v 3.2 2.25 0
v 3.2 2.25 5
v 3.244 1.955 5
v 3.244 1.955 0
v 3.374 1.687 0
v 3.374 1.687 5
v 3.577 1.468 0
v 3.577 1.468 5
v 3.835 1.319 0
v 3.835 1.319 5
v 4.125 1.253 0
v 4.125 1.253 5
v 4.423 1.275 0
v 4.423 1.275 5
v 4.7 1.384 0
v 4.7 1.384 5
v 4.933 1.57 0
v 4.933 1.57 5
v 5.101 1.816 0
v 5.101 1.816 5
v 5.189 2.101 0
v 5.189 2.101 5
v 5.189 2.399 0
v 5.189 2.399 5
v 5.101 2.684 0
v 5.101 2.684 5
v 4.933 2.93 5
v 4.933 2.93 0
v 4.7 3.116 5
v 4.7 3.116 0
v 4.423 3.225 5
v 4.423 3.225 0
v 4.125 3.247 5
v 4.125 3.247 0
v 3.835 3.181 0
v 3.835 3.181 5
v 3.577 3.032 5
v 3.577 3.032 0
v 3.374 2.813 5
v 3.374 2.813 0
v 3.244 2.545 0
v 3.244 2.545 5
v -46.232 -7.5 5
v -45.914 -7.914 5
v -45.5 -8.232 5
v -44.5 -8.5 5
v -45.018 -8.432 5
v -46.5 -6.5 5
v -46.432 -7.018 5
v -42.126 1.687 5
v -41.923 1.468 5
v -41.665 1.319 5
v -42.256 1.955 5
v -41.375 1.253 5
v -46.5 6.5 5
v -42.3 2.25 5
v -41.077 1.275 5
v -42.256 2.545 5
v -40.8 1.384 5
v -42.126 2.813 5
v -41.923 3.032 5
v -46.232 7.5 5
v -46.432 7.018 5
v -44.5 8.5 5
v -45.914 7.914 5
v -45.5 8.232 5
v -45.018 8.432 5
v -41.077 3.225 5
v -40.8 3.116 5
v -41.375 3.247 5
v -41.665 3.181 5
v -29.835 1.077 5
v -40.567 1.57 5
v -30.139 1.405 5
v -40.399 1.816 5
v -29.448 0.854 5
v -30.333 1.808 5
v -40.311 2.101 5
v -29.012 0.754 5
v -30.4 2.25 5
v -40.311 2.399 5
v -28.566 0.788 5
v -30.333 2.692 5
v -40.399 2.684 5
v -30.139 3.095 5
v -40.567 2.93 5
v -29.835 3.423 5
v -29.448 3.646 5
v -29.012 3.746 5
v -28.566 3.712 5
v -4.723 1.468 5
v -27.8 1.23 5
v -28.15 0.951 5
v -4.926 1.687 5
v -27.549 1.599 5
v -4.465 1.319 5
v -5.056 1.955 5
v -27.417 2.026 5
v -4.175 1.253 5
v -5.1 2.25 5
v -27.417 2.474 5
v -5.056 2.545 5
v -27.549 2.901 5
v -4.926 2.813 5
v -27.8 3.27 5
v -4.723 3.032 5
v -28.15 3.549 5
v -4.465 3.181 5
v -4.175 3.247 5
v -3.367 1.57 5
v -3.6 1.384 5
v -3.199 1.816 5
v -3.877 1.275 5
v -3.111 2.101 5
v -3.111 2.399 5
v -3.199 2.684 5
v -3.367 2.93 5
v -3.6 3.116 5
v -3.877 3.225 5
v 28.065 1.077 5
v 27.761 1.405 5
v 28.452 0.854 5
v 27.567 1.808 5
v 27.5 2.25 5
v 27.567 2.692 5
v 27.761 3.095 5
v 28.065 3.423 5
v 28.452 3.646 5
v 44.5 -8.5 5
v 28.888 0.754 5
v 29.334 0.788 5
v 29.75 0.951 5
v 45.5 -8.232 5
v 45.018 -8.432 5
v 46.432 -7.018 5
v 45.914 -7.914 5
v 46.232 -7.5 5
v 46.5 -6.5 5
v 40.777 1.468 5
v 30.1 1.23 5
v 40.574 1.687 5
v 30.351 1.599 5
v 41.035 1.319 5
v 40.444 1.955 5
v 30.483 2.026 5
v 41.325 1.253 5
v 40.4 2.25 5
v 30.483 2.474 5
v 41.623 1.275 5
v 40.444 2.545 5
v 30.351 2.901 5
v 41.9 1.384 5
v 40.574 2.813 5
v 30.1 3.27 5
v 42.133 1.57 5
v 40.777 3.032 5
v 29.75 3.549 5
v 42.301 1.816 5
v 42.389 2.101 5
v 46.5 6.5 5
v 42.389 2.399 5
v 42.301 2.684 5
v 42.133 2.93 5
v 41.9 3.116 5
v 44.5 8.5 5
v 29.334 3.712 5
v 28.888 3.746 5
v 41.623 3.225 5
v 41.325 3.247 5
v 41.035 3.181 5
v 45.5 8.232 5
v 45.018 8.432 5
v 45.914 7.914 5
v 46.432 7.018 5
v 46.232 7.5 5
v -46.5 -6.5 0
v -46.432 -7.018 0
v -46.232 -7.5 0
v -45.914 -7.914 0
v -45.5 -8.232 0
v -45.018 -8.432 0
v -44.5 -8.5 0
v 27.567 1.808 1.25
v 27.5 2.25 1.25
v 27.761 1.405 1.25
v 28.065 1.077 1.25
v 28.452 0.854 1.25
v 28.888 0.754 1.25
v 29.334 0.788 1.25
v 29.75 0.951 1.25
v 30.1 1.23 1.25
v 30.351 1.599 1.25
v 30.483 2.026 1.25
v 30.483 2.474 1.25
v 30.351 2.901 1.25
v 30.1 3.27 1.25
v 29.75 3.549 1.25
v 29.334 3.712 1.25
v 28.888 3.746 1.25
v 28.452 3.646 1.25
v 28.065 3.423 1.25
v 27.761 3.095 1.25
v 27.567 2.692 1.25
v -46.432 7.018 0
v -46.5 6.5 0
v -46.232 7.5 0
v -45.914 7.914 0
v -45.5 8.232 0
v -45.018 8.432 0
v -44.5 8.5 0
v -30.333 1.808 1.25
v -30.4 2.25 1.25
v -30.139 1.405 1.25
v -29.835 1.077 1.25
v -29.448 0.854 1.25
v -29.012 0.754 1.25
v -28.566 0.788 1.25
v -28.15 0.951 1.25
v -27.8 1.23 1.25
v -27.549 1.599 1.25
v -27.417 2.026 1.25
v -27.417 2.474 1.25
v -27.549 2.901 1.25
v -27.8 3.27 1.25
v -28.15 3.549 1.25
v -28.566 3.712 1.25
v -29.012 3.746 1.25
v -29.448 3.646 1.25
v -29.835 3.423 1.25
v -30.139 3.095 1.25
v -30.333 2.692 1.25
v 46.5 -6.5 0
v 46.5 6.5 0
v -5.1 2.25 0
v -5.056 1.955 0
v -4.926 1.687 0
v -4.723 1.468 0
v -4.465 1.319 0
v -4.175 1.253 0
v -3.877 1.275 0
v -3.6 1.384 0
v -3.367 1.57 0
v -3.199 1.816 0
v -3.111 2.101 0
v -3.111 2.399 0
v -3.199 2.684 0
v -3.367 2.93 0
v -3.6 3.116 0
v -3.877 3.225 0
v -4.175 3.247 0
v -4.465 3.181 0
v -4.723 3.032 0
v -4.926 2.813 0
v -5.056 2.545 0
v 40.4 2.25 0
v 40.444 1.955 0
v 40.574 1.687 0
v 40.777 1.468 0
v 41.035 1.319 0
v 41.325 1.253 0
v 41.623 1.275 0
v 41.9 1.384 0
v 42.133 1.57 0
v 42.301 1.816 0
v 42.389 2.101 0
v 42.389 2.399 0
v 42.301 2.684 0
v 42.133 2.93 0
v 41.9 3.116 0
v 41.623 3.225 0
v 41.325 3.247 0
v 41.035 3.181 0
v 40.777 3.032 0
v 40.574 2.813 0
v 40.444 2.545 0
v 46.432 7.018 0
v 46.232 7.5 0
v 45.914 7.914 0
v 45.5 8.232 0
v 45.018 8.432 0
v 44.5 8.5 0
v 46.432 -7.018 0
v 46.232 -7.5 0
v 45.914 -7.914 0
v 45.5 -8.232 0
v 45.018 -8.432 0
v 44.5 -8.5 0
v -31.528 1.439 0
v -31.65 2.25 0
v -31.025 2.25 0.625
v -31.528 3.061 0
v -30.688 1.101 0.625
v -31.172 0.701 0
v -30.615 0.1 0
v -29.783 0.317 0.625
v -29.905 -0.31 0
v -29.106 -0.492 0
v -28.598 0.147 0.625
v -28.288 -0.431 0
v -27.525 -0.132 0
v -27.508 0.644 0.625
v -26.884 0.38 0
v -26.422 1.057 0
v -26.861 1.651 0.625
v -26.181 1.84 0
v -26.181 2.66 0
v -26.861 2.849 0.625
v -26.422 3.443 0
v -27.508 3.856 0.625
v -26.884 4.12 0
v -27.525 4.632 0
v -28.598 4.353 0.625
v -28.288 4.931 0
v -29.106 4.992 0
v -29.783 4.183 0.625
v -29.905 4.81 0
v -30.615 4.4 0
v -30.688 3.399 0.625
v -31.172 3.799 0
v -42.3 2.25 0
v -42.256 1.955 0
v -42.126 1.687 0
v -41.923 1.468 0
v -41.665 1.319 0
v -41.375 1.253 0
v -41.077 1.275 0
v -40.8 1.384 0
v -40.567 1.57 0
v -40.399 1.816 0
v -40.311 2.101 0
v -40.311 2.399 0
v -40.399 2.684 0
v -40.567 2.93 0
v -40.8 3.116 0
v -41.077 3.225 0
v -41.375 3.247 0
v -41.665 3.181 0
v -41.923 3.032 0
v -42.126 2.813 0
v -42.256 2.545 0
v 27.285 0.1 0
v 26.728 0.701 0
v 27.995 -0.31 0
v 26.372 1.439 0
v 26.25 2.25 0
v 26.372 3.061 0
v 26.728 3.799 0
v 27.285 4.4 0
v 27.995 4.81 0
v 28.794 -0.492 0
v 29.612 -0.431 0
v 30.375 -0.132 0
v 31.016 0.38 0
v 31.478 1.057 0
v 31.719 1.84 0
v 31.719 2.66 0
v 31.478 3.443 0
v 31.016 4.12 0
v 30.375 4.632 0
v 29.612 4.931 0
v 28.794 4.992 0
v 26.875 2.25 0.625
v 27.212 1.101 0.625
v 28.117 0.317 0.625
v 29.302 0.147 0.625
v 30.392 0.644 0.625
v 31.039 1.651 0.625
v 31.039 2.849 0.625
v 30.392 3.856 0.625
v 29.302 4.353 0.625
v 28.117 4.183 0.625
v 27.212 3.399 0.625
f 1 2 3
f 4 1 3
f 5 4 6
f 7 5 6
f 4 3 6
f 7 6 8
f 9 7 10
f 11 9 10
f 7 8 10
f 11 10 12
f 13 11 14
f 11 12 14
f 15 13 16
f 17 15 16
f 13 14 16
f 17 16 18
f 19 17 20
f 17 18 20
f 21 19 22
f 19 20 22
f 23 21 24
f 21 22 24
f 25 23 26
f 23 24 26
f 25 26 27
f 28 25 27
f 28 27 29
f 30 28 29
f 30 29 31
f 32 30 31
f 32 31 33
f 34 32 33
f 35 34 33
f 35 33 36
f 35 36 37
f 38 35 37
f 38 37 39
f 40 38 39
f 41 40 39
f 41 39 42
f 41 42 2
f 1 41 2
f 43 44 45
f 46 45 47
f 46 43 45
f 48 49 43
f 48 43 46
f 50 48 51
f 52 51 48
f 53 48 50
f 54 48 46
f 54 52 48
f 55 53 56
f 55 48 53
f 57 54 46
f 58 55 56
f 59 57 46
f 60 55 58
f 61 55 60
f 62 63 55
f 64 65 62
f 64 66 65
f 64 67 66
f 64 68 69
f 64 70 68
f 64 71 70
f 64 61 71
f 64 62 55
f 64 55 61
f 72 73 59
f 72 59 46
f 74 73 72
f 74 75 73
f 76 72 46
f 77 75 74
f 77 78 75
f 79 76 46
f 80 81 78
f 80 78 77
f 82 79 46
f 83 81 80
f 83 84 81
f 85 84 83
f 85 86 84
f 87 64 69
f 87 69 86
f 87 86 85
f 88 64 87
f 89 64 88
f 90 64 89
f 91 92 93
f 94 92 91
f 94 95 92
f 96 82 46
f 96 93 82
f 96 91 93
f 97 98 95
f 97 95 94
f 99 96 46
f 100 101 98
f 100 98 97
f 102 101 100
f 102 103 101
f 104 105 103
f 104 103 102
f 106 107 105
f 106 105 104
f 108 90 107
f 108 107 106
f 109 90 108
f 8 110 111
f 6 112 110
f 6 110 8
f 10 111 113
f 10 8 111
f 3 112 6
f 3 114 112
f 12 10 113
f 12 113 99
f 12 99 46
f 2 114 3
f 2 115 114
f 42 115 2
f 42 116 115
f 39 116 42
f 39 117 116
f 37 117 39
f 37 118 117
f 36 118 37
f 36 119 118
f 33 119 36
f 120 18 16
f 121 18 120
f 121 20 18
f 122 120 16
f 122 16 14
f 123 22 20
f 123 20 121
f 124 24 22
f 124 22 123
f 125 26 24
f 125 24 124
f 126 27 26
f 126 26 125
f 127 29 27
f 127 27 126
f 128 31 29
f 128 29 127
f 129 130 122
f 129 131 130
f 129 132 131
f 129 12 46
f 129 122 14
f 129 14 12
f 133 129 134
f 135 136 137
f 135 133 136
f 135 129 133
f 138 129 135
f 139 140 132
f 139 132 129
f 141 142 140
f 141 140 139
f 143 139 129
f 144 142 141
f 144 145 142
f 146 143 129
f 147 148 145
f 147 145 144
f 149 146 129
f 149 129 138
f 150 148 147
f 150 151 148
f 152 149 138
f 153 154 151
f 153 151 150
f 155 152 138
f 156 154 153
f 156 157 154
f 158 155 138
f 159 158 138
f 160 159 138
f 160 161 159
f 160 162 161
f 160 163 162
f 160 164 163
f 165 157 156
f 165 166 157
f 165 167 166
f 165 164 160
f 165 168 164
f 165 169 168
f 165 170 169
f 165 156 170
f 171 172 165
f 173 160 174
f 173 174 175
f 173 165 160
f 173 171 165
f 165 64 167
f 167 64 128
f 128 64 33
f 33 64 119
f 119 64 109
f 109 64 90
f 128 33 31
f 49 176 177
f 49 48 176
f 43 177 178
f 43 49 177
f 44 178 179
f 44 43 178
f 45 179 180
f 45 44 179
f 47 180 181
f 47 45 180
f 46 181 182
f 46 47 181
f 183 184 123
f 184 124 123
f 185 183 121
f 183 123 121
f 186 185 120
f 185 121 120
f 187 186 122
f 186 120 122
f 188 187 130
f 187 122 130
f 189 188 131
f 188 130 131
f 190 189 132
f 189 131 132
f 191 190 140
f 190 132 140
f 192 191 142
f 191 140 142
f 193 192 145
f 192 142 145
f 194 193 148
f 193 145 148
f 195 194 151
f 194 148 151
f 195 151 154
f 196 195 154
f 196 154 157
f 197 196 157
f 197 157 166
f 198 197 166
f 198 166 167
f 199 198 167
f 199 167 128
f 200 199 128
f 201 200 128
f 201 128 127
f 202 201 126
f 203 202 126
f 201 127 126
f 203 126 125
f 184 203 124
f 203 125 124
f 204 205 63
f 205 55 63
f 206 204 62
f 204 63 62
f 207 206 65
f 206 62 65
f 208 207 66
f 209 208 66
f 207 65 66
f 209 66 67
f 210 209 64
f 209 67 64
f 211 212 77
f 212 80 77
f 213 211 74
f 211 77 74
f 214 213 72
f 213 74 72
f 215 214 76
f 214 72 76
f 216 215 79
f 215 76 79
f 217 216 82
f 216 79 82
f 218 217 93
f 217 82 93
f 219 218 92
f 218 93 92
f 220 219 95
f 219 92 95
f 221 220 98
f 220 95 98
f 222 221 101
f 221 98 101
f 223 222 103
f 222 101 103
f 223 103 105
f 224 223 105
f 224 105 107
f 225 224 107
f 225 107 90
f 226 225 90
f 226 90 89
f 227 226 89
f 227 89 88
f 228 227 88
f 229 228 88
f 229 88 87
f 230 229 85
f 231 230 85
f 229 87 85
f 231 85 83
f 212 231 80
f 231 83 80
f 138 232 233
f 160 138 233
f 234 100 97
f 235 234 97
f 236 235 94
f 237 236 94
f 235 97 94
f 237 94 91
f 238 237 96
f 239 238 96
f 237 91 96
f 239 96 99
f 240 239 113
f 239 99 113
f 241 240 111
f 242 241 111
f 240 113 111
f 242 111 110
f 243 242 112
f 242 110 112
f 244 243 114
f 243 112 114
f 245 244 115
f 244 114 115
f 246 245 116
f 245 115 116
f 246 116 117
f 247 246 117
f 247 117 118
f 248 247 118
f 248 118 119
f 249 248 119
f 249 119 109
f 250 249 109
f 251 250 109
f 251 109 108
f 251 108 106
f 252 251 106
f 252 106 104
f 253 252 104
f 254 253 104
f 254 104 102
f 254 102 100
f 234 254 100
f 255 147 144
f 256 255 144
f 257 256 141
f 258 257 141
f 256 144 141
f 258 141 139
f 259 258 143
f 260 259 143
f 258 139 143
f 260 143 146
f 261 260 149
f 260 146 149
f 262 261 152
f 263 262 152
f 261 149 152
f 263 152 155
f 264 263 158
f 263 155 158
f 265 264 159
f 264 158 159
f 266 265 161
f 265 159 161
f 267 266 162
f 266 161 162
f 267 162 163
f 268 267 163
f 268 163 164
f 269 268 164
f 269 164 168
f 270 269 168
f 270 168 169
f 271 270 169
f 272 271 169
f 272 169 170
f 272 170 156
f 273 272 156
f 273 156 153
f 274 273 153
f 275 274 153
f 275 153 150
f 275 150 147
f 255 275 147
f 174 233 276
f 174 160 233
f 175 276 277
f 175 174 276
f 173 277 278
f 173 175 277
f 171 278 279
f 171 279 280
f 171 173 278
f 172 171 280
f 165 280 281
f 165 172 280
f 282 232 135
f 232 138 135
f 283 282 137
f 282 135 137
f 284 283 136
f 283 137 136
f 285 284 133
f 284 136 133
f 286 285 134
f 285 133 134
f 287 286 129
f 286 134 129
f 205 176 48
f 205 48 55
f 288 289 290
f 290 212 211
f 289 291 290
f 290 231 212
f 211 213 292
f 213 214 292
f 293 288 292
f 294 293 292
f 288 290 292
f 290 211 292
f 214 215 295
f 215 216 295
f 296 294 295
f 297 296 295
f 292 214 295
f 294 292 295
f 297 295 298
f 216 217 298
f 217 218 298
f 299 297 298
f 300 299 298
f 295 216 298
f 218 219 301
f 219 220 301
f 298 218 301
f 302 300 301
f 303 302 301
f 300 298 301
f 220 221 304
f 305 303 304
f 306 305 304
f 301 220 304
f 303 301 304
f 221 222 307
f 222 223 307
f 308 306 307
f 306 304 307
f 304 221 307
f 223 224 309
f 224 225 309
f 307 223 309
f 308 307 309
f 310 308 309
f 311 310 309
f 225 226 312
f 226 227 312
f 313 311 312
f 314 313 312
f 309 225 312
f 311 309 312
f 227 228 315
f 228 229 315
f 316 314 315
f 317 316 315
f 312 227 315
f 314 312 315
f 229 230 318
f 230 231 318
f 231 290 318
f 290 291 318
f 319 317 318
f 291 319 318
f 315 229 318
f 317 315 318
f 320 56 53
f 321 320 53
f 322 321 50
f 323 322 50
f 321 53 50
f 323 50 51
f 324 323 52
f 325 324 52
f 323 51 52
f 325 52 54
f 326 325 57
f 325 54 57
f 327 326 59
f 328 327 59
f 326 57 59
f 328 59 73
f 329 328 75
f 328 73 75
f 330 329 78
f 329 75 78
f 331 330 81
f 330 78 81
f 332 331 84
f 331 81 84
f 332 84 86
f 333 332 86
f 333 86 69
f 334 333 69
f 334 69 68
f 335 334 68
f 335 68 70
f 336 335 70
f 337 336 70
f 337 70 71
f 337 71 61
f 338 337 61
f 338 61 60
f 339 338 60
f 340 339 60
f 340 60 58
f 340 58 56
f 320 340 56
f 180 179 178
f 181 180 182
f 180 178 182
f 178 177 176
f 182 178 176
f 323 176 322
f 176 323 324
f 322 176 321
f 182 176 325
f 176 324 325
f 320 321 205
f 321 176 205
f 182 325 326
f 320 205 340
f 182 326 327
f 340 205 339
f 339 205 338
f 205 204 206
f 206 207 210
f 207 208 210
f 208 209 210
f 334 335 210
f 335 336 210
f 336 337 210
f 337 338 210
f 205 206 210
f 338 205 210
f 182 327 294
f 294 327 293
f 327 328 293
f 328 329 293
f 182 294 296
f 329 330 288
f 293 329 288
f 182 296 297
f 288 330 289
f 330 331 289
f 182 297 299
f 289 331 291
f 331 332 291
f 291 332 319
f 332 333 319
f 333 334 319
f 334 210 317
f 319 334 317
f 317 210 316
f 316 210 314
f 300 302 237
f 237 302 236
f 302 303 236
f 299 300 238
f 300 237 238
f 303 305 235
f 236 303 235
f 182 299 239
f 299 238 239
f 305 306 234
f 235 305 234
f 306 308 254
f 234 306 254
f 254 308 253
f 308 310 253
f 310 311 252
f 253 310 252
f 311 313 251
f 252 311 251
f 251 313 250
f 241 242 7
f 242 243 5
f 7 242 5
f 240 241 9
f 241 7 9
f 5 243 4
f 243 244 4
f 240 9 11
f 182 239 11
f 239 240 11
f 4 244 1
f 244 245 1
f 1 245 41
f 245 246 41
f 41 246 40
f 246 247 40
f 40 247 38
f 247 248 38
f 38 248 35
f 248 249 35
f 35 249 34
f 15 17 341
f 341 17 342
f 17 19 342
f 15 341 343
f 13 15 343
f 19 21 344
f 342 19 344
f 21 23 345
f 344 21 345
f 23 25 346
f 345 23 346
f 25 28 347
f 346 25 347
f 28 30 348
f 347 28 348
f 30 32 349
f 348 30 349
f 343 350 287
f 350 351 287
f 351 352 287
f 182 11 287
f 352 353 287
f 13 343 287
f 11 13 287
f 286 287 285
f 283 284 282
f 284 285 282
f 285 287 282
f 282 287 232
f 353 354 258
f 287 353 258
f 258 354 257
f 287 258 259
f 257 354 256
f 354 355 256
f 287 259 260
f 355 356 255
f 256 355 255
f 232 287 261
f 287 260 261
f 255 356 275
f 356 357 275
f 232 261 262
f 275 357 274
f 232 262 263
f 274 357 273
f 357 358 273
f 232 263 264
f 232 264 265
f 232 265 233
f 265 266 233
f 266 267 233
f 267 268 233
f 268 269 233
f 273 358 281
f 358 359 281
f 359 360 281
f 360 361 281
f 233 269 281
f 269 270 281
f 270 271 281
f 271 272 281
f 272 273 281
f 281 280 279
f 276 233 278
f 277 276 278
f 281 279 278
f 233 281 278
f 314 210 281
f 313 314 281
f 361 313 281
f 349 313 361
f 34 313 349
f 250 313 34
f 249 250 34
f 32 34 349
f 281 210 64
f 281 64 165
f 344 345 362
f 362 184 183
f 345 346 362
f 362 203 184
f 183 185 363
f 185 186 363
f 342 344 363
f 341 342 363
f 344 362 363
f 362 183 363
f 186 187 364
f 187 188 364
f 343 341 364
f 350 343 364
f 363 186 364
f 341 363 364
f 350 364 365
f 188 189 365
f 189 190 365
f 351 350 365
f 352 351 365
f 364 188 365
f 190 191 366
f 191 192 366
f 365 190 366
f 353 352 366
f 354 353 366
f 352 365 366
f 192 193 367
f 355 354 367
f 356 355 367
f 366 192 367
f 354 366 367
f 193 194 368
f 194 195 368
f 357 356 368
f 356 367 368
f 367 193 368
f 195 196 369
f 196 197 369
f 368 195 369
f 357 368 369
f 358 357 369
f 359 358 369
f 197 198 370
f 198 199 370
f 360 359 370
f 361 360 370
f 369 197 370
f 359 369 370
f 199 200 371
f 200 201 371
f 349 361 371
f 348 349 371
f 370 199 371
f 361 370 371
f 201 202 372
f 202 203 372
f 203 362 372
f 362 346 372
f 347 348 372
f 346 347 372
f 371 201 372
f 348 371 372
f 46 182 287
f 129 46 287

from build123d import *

# Parameters (mm, degrees)
F0_W           = 93
F0_H           = 17
F1_DEPTH       = 5
F2_D           = 2
F3_D           = 3
F3_CSINK_D     = 5.5
F3_CSINK_ANGLE = 90
F4_R           = 2


with BuildPart() as f1:
    # F0 (on Top) → F1 (new body)
    with BuildSketch(Plane.XY):
        Rectangle(F0_W, F0_H)
    extrude(amount=F1_DEPTH)

    # F2 (through all)
    with Locations(Plane(origin=(0, 0, 0), x_dir=(1, 0, 0), z_dir=(0, 0, -1))):
        with Locations((-41.3, -2.25), (-4.1, -2.25), (4.2, -2.25), (41.4, -2.25)):
            Hole(F2_D / 2)

    # F3 (through all)
    with Locations(Plane(origin=(0, 0, 0), x_dir=(1, 0, 0), z_dir=(0, 0, -1))):
        with Locations((29, -2.25), (-28.9, -2.25)):
            CounterSinkHole(F3_D / 2, F3_CSINK_D / 2, counter_sink_angle=F3_CSINK_ANGLE)

    # F4
    f4_edges = [f1.edges().sort_by_distance(p)[0] for p in [
        (46.5, 8.5, 2.5),
        (46.5, -8.5, 2.5),
        (-46.5, 8.5, 2.5),
        (-46.5, -8.5, 2.5),
    ]]
    fillet(f4_edges, radius=F4_R)


solid = f1.part
